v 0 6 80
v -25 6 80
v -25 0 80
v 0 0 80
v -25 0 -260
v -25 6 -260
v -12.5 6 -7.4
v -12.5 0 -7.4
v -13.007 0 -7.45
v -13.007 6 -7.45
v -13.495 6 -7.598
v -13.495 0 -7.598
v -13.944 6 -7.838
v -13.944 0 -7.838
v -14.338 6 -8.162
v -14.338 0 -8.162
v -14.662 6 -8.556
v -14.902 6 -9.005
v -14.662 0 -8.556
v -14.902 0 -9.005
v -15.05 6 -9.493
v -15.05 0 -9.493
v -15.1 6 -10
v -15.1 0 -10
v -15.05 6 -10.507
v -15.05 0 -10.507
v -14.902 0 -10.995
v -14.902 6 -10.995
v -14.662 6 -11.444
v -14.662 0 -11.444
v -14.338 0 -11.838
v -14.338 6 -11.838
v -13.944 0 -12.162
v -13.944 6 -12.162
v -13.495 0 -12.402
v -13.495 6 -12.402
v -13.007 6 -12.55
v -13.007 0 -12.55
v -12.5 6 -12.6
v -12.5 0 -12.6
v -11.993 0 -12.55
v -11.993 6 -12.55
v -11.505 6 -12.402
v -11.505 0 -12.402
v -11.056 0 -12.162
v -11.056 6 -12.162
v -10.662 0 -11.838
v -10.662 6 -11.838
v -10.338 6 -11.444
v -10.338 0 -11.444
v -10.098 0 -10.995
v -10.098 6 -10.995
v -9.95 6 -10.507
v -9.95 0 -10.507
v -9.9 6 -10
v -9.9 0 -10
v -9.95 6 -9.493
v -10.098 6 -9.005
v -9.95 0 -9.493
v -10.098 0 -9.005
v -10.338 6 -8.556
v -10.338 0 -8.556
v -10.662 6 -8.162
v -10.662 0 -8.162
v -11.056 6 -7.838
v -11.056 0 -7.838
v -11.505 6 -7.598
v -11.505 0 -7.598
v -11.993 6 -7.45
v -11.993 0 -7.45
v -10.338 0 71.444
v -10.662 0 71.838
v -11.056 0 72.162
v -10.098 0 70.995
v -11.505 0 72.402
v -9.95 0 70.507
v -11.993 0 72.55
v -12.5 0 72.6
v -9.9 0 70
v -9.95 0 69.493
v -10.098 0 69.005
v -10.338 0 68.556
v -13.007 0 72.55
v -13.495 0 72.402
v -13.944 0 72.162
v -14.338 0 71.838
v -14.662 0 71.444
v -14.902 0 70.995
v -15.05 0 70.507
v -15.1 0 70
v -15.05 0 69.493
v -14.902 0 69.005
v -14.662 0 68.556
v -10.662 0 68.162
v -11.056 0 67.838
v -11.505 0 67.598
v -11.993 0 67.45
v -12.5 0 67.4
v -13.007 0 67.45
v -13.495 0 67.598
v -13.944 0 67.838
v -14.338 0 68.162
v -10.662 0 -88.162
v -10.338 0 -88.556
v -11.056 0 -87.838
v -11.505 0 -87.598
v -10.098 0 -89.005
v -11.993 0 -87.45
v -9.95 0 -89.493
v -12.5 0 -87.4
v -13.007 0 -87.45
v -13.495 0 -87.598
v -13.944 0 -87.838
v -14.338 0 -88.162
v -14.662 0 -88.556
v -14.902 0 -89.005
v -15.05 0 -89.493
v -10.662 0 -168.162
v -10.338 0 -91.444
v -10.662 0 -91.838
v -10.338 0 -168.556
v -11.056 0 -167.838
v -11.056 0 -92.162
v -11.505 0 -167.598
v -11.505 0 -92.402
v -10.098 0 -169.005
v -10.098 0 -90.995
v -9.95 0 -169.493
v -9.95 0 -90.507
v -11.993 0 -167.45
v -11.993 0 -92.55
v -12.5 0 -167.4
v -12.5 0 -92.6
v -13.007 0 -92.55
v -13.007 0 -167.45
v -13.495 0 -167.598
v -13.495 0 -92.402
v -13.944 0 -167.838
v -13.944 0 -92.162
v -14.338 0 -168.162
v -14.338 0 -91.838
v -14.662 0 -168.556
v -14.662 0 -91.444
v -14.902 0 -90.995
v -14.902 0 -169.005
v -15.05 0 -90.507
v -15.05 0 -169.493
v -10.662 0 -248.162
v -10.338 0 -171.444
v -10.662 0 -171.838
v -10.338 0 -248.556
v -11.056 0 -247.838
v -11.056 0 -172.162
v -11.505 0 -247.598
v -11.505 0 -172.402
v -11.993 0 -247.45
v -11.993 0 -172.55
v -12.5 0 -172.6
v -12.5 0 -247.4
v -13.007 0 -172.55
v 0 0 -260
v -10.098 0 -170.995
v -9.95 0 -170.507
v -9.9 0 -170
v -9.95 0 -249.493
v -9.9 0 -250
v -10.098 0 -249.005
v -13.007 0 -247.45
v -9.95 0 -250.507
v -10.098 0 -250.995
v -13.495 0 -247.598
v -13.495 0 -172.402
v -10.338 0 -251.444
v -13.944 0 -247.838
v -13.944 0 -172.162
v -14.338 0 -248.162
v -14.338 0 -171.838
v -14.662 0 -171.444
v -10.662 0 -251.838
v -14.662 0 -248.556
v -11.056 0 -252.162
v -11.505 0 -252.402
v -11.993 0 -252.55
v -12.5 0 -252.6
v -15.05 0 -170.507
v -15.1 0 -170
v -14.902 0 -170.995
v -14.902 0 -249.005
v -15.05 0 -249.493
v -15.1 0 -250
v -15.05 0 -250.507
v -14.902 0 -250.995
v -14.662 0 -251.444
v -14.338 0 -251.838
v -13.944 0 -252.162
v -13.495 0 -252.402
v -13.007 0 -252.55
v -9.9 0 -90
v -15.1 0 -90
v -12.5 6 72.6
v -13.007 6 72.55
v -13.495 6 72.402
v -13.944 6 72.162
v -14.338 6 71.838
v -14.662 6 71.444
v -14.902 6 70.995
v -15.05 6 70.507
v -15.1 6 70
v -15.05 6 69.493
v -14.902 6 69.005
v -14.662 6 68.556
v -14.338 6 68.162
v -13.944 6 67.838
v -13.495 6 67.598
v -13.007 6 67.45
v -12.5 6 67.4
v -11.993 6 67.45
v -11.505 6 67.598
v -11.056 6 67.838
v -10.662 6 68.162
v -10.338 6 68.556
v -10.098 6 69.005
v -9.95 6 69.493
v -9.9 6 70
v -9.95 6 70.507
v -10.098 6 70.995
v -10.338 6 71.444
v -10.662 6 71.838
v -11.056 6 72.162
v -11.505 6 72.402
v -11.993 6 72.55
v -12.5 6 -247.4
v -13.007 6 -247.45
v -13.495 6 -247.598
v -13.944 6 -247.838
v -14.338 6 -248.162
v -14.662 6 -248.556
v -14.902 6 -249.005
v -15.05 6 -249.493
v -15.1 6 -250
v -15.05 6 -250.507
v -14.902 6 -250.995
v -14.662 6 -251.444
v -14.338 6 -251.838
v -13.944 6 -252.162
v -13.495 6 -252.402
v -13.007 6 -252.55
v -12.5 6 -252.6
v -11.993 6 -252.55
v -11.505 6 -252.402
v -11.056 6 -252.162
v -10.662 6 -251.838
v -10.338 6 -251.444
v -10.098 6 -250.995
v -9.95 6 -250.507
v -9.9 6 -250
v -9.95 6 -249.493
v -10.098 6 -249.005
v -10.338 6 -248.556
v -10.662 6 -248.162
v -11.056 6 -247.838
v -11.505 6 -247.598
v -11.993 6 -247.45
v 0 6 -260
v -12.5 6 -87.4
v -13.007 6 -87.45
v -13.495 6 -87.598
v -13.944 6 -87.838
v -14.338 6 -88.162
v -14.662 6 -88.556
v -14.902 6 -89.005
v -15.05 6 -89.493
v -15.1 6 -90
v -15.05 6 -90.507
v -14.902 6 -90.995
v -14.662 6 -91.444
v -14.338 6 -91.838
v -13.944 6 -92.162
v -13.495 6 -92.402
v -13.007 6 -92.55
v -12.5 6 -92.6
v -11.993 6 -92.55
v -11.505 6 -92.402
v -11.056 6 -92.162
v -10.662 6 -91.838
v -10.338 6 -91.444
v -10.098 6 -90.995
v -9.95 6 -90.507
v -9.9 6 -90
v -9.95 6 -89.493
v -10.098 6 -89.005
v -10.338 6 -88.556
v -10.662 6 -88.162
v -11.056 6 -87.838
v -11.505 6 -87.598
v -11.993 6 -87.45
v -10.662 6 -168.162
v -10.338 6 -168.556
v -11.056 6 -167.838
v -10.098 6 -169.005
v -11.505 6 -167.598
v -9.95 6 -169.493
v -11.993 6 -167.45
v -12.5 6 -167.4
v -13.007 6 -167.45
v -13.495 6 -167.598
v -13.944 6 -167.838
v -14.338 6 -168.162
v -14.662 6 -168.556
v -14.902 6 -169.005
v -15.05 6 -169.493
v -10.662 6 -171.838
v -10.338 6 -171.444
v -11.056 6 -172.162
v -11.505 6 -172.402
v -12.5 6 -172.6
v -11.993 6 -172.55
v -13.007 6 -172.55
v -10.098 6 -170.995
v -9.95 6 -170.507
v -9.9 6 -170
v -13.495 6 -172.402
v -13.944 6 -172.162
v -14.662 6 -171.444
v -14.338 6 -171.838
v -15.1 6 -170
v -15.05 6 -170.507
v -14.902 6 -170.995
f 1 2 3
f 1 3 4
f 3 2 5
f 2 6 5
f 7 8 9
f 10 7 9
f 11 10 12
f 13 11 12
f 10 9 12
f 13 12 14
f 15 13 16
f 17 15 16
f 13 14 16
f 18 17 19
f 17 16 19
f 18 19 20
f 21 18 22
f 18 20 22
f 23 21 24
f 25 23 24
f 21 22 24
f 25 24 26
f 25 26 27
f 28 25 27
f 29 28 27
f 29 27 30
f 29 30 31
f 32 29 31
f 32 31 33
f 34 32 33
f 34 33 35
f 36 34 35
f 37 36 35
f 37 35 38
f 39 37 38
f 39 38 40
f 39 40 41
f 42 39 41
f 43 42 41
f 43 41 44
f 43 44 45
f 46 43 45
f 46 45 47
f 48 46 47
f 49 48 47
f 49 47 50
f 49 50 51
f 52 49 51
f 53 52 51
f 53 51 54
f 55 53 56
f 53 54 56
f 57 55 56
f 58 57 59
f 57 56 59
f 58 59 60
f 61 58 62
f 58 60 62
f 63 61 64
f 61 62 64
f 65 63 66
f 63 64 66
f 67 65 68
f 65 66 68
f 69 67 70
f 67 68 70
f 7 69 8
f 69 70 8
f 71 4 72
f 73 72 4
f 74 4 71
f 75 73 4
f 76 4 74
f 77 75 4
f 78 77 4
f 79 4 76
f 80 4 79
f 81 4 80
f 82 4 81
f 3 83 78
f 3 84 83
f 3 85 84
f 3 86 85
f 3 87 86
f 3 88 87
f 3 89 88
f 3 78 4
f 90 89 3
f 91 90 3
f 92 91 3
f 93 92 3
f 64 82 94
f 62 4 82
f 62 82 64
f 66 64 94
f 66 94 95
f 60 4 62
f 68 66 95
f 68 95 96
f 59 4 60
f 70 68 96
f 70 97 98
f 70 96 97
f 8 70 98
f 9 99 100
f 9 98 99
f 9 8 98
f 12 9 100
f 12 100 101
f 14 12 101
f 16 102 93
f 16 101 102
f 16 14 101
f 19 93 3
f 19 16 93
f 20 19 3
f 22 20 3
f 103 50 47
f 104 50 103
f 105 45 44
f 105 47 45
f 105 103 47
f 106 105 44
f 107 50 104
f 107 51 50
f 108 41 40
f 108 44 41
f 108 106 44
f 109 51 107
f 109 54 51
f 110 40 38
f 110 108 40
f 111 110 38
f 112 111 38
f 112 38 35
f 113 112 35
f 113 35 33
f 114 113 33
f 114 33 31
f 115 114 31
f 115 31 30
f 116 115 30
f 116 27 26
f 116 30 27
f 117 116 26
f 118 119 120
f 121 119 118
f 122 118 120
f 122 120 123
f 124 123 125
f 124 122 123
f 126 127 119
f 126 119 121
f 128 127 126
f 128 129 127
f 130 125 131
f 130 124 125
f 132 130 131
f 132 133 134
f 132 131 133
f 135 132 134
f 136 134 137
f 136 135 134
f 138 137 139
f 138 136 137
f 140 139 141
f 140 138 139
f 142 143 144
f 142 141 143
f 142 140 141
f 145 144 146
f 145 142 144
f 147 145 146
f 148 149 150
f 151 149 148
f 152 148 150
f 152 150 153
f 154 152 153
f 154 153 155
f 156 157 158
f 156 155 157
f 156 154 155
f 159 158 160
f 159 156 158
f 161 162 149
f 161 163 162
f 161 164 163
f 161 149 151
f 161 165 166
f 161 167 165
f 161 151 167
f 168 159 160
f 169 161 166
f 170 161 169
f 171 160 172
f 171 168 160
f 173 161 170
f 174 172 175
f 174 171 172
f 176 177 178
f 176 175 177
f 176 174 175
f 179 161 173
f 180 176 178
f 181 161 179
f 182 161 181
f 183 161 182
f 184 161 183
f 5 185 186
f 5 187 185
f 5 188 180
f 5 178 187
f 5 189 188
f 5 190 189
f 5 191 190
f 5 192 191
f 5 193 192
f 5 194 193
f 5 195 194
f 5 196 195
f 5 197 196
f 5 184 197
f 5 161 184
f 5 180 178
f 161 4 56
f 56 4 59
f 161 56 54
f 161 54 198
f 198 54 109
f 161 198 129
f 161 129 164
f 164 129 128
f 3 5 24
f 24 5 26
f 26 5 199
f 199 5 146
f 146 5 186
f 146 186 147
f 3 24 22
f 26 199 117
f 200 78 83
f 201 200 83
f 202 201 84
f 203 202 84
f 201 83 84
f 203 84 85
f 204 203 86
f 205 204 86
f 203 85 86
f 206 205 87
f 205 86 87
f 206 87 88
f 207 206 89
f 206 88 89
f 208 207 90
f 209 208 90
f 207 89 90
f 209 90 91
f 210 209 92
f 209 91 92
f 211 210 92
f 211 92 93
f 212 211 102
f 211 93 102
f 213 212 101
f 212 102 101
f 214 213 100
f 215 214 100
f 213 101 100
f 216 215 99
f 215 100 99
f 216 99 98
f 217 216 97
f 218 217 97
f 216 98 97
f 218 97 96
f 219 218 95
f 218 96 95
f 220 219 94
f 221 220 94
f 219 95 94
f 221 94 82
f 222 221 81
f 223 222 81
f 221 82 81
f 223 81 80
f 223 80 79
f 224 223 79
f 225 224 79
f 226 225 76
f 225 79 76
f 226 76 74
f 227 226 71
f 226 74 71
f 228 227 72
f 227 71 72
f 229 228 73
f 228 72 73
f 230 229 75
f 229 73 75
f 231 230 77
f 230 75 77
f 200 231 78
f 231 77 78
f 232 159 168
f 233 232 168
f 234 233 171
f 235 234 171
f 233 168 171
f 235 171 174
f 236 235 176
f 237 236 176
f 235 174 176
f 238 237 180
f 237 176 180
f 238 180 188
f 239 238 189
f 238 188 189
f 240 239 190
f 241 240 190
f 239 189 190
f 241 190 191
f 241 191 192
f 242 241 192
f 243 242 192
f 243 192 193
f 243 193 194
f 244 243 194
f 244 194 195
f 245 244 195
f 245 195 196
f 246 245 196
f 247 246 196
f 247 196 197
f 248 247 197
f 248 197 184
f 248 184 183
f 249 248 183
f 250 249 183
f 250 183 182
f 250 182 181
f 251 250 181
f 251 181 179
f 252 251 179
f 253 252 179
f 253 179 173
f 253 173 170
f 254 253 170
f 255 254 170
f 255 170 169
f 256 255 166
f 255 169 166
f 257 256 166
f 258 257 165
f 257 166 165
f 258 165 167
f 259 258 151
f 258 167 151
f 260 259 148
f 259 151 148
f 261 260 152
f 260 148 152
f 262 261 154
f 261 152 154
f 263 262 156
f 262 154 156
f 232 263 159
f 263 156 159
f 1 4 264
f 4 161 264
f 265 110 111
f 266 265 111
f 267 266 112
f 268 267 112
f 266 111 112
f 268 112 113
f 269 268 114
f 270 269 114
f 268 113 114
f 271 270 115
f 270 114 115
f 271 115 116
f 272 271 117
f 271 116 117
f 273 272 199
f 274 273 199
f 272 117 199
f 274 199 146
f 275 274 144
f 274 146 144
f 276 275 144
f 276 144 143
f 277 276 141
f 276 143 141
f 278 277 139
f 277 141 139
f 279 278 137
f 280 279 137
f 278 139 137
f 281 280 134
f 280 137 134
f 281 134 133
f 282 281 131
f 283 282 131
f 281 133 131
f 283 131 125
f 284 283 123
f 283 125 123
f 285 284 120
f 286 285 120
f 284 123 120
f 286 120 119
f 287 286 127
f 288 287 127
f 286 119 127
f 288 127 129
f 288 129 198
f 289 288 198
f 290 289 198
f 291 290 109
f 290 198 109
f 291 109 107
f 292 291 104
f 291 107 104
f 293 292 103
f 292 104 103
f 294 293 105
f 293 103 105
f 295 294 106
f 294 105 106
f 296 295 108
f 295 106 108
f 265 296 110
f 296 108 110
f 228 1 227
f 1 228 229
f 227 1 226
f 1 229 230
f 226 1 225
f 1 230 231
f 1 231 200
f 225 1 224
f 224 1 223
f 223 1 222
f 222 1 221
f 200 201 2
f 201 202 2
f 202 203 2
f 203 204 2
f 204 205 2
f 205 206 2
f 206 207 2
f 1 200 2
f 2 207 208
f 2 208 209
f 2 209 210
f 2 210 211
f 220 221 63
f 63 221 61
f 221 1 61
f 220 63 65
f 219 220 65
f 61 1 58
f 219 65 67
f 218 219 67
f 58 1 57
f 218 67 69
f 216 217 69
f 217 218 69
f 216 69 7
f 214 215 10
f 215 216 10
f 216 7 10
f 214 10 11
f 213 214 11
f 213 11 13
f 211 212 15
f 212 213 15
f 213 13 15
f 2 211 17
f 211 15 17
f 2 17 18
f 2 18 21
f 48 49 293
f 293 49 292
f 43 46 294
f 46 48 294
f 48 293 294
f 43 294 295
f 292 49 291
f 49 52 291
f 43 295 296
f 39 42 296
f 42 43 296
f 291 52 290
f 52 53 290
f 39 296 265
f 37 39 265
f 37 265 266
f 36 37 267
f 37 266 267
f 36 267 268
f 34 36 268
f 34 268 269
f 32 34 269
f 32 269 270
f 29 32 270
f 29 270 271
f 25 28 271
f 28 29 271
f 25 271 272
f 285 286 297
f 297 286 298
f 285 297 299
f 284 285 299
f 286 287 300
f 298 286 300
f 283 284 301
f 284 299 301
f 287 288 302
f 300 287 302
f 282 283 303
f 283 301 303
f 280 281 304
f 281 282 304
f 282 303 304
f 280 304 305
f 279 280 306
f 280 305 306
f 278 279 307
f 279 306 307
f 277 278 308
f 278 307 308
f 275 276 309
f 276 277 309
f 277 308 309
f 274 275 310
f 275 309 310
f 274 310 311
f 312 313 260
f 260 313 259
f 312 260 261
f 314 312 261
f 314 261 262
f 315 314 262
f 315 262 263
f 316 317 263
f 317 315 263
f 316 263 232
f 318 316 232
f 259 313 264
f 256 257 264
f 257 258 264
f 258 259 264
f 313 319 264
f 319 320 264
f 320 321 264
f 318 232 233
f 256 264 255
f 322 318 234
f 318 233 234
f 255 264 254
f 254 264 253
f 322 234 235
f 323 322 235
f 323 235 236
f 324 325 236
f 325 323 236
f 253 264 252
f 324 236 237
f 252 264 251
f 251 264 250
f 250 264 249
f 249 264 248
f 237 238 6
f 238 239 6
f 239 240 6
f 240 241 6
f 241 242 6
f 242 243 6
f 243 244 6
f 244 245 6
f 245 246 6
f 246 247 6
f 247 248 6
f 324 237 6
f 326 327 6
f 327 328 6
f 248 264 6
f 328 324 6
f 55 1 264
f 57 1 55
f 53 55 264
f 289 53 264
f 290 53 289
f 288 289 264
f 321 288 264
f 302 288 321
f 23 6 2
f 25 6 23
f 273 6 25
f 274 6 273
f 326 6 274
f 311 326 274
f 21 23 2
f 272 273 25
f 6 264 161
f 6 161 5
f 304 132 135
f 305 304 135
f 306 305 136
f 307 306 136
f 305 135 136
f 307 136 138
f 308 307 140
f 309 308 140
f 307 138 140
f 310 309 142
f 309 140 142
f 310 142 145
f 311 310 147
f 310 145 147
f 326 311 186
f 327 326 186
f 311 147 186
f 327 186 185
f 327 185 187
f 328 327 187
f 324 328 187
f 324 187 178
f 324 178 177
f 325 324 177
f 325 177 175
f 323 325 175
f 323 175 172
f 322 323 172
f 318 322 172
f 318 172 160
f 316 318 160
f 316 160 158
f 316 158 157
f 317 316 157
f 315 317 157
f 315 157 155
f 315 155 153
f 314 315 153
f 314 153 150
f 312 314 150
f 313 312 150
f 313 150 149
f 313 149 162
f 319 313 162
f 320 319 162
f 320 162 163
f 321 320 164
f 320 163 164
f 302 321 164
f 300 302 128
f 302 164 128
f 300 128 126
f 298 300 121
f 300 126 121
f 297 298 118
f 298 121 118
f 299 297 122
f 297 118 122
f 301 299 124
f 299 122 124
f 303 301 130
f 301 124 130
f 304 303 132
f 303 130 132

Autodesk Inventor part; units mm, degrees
ref_plane "YZ Plane" through (0, 0, 0) normal (1, 0, 0) x (0, 1, 0)
ref_plane "XZ Plane" through (0, 0, 0) normal (0, 1, 0) x (-1, 0, 0)
ref_plane "XY Plane" through (0, 0, 0) normal (0, 0, 1) x (1, 0, 0)
sketch "スケッチ1" plane through (0, 0, 0) normal (0, 1, 0) x (-1, 0, 0)
  line L0 (0, 0) -> (25, 0)
  line L1 (25, 0) -> (25, -340)
  line L2 (25, -340) -> (0, -340)
  line L3 (0, -340) -> (0, 0)
  dimension "d0" = 25
  dimension "d1" = 340
extrude "押し出し1" add sketch "スケッチ1" along normal blind 6
sketch "スケッチ2" plane through (0, 6, 0) normal (0, 1, 0) x (1, 0, 0)
  line L0 (-25, 0) -> (0, 0) projected
  line L1 (-12.5, 0) -> (-12.5, 340) construction
  line L2 (0, 340) -> (-25, 340) projected
  point P0 (-12.5, 10)
  point P1 (-12.5, 90)
  point P2 (-12.5, 170)
  point P3 (-12.5, 250)
  point P4 (-12.5, 330)
  dimension "d4" = 10
  dimension "d5" = 80
  dimension "d6" = 80
  dimension "d7" = 80
  dimension "d8" = 80
hole "穴1" at (-12.5, 6, -10) at (-12.5, 6, -90) at (-12.5, 6, -170) at (-12.5, 6, -250) at (-12.5, 6, -330) direction (0, -1, 0) diameter 5.2 depth 30 tip angle 118
sketch "スケッチ3" plane through (0, 0, -340) normal (0, 0, -1) x (-1, 0, 0)
  line L0 (25, 0) -> (25, 6) projected
  line L1 (0, 0) -> (25, 0)
  line L2 (25, 0) -> (25, 6)
  line L3 (25, 6) -> (0, 6)
  line L4 (0, 6) -> (0, 0)
sketch "スケッチ5" plane through (-25, 0, 0) normal (0, 0, 1) x (1, 0, 0)
  line L0 (25, 0) -> (0, 0) projected
  line L1 (25, 6) -> (0, 6) projected
  line L2 (0, 0) -> (25, 0)
  line L3 (25, 0) -> (25, 6)
  line L4 (25, 6) -> (0, 6)
  line L5 (0, 6) -> (0, 0)
extrude "押し出し3" add sketch "スケッチ5" along normal blind 80
sketch "スケッチ6" plane through (0, 6, 0) normal (0, 1, 0) x (1, 0, 0)
  line L0 (0, 340) -> (0, -80) projected
  circle A0 centre (-12.5, 10) radius 2.6 projected
  point P0 (0, 0)
  point P1 (-12.5, -70)
  dimension "d20" = 12.5
  dimension "d21" = 80
hole "穴2" at (-12.5, 6, 70) direction (0, -1, 0) diameter 5.2 end through all
sketch "スケッチ7" plane through (0, 0, -340) normal (0, 0, -1) x (-1, 0, 0)
  line L0 (0, 6) -> (25, 6) projected
  line L1 (0, 0) -> (25, 0) projected
  line L2 (25, 6) -> (0, 6)
  line L3 (0, 6) -> (0, 0)
  line L4 (0, 0) -> (25, 0)
  line L5 (25, 0) -> (25, 6)
extrude "押し出し4" cut sketch "スケッチ3" against normal blind 80
properties part number "slider_rail_gaba" material "アルミニウム 6061-AHC"
